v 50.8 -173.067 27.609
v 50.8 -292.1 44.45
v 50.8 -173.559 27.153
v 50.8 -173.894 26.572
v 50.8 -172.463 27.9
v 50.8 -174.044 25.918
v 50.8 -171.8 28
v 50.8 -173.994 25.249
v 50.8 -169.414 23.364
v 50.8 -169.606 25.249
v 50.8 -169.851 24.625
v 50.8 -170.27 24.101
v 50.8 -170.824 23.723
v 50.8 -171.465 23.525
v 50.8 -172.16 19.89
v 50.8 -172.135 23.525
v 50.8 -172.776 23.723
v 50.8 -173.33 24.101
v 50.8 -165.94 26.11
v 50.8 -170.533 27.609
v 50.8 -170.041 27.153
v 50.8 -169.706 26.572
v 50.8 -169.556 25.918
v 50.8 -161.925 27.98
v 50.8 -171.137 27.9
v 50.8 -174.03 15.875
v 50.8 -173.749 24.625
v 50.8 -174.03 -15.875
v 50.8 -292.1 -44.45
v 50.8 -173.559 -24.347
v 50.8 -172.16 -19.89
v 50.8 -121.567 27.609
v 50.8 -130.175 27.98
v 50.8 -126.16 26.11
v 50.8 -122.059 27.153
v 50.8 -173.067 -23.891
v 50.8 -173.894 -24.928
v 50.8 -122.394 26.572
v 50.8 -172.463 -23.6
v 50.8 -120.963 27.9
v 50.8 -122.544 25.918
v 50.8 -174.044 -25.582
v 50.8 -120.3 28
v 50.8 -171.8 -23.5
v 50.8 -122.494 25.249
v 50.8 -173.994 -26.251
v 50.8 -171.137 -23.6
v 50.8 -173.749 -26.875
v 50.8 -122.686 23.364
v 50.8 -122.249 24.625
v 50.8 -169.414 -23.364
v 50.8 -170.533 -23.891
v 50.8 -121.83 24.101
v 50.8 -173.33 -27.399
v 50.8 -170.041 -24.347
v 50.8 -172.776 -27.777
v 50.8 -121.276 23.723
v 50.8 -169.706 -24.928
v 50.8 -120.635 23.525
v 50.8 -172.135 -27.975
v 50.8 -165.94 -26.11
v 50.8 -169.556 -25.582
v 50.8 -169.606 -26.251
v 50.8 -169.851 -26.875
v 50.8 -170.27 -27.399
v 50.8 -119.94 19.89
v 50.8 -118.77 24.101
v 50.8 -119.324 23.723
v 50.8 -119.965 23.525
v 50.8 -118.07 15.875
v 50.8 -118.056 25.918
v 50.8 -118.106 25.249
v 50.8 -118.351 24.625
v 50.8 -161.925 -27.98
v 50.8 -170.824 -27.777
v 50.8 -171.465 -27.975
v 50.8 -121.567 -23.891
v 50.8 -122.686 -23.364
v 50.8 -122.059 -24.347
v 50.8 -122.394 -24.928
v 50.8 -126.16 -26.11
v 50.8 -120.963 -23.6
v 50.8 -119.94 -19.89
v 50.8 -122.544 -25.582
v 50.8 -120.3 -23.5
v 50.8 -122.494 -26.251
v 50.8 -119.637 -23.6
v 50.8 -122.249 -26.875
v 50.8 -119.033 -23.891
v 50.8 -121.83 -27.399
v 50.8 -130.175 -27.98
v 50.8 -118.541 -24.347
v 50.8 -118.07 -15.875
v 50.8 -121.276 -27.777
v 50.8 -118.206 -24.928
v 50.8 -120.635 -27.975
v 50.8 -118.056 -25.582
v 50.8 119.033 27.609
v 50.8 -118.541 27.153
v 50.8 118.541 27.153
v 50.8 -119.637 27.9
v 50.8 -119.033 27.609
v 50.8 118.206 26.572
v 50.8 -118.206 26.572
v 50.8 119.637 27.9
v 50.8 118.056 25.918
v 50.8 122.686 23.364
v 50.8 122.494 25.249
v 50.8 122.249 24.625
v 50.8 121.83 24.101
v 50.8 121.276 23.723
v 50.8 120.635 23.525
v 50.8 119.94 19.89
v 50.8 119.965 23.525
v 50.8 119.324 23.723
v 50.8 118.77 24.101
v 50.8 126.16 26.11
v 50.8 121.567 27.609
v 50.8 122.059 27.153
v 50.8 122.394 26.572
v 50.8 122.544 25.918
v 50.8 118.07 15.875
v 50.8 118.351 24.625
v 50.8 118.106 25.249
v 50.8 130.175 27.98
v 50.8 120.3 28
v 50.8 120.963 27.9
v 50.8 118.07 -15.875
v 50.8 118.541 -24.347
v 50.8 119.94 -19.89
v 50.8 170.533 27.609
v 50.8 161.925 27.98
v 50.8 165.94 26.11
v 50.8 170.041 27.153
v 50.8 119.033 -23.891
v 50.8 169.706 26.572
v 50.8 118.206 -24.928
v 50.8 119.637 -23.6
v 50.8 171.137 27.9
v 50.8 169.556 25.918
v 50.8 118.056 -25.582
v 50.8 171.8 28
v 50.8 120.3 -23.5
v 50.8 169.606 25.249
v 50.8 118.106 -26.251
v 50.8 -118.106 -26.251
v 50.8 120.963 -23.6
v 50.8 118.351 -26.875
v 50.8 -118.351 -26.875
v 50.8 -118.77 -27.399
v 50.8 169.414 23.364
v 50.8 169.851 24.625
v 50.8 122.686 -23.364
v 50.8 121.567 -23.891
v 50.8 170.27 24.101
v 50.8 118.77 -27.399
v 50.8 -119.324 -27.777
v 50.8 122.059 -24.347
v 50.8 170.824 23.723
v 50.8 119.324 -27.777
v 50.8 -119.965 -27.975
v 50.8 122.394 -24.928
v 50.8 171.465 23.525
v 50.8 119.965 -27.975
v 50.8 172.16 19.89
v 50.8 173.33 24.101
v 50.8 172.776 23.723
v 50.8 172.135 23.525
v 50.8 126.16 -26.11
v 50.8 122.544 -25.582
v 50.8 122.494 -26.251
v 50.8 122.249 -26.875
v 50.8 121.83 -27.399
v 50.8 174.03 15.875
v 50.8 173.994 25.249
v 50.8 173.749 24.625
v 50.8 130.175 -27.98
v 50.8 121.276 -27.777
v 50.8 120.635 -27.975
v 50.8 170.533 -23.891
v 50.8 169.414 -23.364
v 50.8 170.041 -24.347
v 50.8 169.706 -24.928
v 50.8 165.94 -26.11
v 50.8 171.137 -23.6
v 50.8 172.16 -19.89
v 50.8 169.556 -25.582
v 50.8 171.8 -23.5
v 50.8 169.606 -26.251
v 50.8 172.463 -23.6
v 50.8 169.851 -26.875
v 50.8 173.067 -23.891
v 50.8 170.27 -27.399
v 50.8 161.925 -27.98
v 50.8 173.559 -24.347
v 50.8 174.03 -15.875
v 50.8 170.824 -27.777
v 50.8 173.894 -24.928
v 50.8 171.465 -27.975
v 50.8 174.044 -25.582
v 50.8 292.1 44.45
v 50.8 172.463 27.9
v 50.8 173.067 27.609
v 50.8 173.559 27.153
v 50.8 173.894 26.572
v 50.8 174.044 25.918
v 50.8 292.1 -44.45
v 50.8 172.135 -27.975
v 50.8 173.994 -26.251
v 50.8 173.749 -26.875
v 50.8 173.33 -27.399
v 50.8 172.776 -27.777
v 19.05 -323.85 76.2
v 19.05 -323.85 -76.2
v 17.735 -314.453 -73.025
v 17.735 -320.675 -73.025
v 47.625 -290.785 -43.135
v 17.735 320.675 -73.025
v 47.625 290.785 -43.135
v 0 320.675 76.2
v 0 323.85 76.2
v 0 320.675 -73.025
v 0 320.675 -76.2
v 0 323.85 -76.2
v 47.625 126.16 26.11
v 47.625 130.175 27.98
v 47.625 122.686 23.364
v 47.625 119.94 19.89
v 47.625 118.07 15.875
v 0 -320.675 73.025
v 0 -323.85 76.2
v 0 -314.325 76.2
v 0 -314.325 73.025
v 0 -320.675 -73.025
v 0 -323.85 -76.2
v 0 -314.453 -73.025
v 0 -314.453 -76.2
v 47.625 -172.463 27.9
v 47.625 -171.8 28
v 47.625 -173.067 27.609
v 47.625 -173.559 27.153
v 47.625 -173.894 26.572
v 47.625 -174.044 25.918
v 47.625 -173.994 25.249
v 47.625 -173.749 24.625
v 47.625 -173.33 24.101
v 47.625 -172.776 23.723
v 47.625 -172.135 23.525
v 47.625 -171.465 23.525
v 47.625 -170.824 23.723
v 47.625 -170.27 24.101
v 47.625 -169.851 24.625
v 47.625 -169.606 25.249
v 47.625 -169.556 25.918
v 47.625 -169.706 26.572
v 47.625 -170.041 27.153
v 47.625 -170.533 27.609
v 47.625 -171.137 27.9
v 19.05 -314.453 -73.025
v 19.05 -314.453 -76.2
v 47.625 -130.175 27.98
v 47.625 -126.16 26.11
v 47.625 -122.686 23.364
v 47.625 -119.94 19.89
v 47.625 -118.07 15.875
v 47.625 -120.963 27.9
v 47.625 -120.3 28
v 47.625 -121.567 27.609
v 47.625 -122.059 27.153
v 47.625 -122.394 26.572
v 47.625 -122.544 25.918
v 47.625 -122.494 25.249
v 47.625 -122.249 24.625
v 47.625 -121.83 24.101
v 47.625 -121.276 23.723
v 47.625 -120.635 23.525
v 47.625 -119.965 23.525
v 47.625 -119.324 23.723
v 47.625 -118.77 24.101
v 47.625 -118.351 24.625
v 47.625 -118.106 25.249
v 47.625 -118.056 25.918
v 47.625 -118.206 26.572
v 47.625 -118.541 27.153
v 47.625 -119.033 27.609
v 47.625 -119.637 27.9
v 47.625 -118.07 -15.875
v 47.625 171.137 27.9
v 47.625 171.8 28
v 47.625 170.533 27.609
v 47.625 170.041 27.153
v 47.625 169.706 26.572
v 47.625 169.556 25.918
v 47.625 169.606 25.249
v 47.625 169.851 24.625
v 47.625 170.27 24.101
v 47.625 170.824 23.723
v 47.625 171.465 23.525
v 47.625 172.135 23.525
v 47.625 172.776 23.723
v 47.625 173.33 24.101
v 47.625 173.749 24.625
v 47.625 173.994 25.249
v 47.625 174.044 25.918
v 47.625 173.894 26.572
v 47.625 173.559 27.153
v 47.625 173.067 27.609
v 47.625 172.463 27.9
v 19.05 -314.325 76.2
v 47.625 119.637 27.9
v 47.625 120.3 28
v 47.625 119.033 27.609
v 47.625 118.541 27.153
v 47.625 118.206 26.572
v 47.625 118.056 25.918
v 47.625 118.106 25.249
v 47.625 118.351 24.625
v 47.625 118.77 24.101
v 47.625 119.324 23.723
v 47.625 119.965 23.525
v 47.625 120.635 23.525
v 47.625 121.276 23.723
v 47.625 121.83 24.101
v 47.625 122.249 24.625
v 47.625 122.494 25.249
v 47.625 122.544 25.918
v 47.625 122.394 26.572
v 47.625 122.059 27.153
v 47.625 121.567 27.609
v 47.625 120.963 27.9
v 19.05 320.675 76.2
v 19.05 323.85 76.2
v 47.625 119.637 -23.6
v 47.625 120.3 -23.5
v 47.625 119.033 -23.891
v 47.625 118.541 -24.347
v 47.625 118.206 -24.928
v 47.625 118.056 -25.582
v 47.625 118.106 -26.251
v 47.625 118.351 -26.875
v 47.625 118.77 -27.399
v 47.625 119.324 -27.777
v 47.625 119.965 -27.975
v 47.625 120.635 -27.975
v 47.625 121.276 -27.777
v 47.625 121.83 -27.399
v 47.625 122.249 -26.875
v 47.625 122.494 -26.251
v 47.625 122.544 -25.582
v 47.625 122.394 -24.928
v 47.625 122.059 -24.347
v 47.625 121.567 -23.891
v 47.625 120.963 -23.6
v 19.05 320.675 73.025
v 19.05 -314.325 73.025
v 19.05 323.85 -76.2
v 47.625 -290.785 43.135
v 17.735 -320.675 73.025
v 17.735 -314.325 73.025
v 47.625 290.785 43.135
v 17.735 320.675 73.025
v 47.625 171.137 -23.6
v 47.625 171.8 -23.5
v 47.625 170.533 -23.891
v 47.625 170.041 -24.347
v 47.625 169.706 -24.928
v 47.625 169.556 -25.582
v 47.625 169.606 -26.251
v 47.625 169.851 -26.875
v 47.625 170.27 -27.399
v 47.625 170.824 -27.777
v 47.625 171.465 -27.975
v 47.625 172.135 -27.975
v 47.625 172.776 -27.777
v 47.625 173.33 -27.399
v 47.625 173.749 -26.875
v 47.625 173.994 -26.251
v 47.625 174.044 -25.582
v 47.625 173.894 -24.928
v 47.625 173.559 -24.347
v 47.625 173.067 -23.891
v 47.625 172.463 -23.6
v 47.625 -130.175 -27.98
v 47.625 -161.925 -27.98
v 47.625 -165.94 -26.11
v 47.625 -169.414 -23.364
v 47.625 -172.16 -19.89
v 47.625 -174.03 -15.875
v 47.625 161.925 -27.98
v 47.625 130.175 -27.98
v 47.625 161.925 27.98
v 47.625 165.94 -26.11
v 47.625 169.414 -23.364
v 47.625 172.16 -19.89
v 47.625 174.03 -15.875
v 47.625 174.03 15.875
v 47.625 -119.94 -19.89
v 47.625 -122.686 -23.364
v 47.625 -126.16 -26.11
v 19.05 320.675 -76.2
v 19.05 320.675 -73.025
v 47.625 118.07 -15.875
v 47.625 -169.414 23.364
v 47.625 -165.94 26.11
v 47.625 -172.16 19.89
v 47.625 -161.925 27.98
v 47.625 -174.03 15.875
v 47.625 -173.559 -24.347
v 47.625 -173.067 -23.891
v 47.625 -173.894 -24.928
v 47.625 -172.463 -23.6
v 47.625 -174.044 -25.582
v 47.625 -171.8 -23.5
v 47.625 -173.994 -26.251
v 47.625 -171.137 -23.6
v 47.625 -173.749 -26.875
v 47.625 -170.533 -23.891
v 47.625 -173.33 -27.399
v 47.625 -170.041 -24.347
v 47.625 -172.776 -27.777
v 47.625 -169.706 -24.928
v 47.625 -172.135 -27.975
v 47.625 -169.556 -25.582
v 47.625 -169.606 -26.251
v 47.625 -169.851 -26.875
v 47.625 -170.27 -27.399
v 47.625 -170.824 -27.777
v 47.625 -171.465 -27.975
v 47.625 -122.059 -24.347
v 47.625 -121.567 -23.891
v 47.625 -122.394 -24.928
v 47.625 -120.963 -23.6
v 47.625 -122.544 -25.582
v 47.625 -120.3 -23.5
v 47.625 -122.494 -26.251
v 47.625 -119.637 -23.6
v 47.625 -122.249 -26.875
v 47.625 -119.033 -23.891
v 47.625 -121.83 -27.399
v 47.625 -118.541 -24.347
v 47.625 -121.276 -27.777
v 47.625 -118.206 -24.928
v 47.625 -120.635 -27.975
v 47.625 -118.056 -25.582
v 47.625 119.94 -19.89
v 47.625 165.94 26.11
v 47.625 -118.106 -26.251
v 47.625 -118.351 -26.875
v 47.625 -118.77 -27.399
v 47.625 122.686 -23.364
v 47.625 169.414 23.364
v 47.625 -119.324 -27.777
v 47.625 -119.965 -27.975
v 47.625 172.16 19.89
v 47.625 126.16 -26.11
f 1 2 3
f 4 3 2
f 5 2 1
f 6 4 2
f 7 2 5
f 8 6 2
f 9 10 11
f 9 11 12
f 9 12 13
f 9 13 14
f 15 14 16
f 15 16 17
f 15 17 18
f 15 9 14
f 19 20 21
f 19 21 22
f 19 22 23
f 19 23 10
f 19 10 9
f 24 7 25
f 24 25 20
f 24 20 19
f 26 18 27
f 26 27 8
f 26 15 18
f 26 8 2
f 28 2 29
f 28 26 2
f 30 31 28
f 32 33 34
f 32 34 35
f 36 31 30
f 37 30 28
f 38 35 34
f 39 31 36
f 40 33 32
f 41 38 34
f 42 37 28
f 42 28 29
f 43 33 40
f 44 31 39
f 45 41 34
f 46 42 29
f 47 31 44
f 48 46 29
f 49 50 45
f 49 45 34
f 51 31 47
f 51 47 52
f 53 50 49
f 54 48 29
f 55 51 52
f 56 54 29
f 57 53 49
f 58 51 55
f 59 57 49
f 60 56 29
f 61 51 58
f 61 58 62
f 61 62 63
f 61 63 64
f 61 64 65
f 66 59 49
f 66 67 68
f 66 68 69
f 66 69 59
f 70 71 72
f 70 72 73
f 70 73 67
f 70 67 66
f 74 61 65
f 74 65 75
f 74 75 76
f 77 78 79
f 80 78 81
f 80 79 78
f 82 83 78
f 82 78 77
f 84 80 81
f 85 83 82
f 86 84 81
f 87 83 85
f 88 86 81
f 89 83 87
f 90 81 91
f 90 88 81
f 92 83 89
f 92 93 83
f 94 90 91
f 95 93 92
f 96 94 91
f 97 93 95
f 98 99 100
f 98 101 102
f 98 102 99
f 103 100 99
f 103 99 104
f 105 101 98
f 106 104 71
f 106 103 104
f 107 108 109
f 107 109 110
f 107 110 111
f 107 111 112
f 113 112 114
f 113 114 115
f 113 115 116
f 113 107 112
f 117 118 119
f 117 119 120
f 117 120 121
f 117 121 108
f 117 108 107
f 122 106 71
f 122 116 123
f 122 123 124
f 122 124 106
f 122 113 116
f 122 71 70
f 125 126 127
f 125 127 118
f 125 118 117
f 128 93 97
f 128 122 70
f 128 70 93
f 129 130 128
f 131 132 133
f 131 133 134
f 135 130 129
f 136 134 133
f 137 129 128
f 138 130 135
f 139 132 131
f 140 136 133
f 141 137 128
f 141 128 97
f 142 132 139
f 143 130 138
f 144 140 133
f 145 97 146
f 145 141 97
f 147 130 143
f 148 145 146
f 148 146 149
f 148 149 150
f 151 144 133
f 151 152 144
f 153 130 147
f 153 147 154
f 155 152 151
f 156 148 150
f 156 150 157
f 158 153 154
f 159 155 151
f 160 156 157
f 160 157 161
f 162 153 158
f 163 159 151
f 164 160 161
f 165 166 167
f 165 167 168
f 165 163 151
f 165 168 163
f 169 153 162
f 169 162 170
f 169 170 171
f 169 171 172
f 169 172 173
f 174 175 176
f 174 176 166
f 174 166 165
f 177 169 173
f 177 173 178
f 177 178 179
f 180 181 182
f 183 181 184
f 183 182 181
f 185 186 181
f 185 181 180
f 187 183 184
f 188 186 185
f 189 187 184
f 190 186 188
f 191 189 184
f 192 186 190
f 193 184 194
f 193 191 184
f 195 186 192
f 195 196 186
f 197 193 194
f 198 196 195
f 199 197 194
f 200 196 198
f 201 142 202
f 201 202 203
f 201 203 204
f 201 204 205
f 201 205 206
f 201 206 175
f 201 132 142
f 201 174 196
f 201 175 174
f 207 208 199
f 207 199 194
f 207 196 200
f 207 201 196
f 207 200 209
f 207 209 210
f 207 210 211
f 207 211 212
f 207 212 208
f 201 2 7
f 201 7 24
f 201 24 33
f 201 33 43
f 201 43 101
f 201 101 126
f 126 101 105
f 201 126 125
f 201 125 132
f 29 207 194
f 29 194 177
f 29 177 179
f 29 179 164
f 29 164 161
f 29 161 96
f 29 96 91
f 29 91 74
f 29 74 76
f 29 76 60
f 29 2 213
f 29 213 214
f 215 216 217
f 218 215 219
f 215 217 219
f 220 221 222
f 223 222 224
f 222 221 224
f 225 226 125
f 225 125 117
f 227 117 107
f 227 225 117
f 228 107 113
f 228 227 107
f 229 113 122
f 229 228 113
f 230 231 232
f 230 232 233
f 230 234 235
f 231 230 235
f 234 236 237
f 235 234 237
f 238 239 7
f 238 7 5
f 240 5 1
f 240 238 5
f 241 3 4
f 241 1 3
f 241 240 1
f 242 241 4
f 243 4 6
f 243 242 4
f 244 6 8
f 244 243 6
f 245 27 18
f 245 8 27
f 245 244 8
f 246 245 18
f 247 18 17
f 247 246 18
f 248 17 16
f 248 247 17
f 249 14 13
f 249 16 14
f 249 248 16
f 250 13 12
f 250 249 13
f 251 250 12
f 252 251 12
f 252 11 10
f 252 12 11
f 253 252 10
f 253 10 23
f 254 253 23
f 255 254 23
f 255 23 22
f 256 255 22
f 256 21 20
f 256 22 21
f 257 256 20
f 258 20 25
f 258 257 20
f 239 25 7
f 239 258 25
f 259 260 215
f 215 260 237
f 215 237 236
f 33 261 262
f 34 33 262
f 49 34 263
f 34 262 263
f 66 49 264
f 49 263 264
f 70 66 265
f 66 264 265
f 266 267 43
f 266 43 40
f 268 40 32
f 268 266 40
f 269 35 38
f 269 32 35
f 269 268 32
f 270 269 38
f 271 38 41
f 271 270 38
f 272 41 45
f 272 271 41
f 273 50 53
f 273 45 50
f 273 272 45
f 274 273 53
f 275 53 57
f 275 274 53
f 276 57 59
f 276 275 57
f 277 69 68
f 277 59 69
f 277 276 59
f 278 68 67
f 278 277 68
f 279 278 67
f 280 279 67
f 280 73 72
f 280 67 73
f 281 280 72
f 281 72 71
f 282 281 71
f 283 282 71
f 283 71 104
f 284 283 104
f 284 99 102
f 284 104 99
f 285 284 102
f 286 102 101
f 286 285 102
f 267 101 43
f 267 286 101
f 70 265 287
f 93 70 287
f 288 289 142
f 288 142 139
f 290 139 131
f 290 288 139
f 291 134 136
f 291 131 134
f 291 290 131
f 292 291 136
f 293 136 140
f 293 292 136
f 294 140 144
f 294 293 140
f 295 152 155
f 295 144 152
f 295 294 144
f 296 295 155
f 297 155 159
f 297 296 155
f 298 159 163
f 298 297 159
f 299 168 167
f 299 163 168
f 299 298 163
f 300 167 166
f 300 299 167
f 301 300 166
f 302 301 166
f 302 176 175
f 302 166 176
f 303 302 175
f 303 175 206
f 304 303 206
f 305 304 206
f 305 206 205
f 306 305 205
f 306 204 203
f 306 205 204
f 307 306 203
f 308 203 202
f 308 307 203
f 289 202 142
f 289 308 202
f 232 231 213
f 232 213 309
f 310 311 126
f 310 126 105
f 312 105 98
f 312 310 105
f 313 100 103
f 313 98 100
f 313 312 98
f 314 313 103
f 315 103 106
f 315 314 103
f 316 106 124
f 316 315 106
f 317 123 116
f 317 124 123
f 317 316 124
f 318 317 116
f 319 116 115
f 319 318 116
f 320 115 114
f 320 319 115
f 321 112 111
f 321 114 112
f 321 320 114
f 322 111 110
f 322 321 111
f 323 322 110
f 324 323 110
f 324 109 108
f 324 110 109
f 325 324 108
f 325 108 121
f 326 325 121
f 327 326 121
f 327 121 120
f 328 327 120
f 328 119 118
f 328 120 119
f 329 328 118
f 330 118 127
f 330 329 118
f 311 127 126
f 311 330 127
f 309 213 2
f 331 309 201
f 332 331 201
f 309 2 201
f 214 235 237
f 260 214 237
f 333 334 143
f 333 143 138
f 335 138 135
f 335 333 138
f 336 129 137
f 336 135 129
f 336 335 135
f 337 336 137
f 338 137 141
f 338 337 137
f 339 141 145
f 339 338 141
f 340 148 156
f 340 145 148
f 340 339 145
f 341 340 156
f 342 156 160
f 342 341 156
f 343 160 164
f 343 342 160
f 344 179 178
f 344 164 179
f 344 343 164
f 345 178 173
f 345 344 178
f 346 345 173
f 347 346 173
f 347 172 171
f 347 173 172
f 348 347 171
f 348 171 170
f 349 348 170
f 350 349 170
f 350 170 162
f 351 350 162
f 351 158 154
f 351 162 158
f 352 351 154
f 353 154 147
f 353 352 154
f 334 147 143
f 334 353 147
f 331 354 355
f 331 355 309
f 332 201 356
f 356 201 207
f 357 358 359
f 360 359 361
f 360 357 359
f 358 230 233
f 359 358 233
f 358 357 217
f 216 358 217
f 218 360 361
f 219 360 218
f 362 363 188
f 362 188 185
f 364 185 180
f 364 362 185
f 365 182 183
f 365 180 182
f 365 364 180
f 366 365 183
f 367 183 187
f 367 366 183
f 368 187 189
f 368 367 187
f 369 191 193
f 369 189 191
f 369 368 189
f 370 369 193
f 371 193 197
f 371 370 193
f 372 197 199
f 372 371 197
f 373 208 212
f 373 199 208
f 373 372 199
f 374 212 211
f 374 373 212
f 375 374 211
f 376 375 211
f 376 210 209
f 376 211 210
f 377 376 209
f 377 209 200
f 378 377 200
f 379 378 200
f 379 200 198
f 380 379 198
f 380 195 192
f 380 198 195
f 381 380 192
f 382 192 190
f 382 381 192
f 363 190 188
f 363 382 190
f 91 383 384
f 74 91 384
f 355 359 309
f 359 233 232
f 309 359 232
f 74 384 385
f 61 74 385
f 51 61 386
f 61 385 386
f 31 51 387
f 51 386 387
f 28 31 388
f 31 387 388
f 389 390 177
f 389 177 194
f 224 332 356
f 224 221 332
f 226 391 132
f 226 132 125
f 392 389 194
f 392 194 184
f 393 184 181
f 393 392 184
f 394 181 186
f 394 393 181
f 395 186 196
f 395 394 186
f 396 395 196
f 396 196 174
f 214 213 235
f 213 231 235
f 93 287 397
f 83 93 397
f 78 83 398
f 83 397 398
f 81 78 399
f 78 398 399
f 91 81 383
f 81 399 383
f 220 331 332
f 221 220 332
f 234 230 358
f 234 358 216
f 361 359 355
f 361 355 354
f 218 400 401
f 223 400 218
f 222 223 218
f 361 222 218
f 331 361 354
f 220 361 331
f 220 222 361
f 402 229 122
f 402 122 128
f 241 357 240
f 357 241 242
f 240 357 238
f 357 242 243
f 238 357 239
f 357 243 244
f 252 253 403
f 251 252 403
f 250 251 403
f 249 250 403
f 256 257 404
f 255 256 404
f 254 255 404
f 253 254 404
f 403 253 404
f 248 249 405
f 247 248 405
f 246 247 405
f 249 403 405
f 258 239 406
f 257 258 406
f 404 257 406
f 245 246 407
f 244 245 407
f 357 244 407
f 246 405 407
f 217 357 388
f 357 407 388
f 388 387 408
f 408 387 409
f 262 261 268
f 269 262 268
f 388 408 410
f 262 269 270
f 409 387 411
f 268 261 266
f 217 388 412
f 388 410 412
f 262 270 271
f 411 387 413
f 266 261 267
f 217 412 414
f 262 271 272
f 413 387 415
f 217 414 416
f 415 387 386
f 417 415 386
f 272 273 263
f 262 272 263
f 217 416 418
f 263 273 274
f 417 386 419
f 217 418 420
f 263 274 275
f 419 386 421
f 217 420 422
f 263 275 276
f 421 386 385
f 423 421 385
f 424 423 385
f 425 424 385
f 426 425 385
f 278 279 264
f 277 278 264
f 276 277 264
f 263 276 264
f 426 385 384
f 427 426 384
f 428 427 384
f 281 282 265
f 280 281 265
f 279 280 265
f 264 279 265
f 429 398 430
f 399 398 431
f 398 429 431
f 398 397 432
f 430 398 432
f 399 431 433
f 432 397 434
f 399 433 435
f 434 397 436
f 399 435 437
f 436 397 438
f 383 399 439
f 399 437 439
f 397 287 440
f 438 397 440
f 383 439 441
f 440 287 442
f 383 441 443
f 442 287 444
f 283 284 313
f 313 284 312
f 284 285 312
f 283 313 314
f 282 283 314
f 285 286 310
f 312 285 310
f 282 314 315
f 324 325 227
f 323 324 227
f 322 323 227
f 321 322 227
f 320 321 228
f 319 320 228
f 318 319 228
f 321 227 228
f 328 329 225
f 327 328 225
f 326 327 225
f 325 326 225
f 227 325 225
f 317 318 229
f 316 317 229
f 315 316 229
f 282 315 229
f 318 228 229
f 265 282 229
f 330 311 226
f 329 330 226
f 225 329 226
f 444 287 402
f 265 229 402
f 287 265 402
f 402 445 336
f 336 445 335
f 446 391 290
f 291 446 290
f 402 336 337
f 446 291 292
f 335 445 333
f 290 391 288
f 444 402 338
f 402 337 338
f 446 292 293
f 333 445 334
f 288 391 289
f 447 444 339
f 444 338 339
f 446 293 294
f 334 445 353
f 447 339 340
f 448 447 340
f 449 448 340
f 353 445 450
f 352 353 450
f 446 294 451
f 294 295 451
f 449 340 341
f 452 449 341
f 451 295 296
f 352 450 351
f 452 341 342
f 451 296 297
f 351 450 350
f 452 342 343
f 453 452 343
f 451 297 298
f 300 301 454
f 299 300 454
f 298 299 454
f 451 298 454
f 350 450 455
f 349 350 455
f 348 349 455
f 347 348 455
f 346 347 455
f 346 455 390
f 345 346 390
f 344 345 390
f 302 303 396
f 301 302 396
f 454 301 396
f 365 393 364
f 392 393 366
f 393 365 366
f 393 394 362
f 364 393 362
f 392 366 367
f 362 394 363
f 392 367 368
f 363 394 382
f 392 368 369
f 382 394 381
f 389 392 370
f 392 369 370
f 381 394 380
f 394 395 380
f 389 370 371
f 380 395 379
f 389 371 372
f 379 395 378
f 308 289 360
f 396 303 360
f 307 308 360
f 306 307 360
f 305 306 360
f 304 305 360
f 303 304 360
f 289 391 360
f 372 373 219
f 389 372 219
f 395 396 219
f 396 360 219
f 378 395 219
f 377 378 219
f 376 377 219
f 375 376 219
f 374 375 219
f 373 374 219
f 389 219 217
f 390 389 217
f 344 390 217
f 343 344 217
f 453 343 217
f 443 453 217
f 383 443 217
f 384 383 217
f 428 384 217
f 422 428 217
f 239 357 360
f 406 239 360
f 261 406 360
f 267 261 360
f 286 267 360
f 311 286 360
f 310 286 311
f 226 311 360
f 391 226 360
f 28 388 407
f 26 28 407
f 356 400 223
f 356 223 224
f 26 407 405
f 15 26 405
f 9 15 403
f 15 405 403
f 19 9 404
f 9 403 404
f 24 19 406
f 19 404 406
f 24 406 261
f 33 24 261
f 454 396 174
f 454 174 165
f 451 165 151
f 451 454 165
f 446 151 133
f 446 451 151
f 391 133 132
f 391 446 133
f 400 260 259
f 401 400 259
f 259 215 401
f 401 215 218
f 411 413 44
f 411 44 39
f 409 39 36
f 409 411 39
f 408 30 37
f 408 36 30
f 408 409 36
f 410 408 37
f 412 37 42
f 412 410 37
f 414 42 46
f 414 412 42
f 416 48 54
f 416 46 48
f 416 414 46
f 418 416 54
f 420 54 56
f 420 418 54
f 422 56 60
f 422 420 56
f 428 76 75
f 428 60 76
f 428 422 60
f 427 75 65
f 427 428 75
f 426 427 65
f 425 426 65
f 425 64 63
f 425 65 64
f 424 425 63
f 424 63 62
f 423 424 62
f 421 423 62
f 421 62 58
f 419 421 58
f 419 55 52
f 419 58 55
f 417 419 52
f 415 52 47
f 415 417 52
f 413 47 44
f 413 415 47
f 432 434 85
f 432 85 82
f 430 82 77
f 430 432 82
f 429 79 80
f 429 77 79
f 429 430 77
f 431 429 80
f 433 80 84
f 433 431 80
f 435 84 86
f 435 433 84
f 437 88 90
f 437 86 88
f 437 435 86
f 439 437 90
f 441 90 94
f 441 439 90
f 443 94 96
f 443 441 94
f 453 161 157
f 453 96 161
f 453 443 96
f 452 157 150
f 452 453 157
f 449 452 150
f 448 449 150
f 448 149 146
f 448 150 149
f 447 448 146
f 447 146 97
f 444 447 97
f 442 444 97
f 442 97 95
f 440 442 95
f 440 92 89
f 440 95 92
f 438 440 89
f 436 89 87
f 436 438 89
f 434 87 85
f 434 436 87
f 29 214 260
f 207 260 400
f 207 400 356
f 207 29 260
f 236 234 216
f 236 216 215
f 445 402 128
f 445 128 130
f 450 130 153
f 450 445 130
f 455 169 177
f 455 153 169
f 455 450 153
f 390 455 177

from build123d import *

# Parameters (mm, degrees)
SKETCH2_W               = 152.4
SKETCH2_H               = 647.7
BOSS_EXTRUDE1_DEPTH     = 50.8
CHAMFER1_SIZE           = 31.75
CHAMFER2_SIZE           = 31.75
SHELL1_T                = -3.175
SKETCH3_W               = 3.175
SKETCH3_H               = 635.128365157
SKETCH3_H_2             = 635
CUT_EXTRUDE1_DEPTH      = 19.05
CUT_EXTRUDE2_DEPTH      = 337.55
CUT_EXTRUDE2_DEPTH_BACK = 337.55
SKETCH4_R               = 2.25


with BuildPart() as part:
    # Sketch2 → Boss-Extrude1 (new body)
    with BuildSketch(Plane(origin=(0, 0, 0), x_dir=(0, 0, -1), z_dir=(1, 0, 0))):
        Rectangle(SKETCH2_W, SKETCH2_H)
    extrude(amount=BOSS_EXTRUDE1_DEPTH)

    # Chamfer1
    chamfer1_edges = [part.edges().sort_by_distance(p)[0] for p in [
        (50.8, 0, 76.2),
        (50.8, 0, -76.2),
    ]]
    chamfer(chamfer1_edges, length=CHAMFER1_SIZE)

    # Chamfer2
    chamfer2_edges = [part.edges().sort_by_distance(p)[0] for p in [
        (50.8, -323.85, 0),
        (50.8, 323.85, 0),
    ]]
    chamfer(chamfer2_edges, length=CHAMFER2_SIZE)

    # Shell1
    shell1_openings = [part.faces().sort_by_distance(p)[0] for p in [
        (0, 0, 0),
    ]]
    offset(amount=SHELL1_T, openings=shell1_openings, kind=Kind.INTERSECTION)

    # Sketch3 → Cut-Extrude1 (cut)
    with BuildSketch(Plane.ZY):
        with Locations((-74.6125, 3.110817422)):
            Rectangle(SKETCH3_W, SKETCH3_H)
        with Locations((74.6125, 3.175)):
            Rectangle(SKETCH3_W, SKETCH3_H_2)
    extrude(amount=-CUT_EXTRUDE1_DEPTH, mode=Mode.SUBTRACT)

    # Sketch4 → Cut-Extrude2 (cut, two sides: drawn at the far end of the back side and taken through both)
    with BuildSketch(Plane(origin=(50.8, 0, 0), x_dir=(0, 0, -1), z_dir=(1, 0, 0)).offset(-CUT_EXTRUDE2_DEPTH_BACK)):
        with Locations(Location((-25.75, 171.8, 0), (0, 0, 180))):
            Circle(SKETCH4_R)
        with Locations(Location((25.75, 171.8, 0), (0, 0, 180))):
            Circle(SKETCH4_R)
        with Locations(Location((-25.75, 120.3, 0), (0, 0, 180))):
            Circle(SKETCH4_R)
        with Locations(Location((25.75, 120.3, 0), (0, 0, 180))):
            Circle(SKETCH4_R)
        with Locations(Location((-25.75, -120.3, 0), (0, 0, 180))):
            Circle(SKETCH4_R)
        with Locations(Location((25.75, -120.3, 0), (0, 0, 180))):
            Circle(SKETCH4_R)
        with Locations(Location((25.75, -171.8, 0), (0, 0, 180))):
            Circle(SKETCH4_R)
        with Locations(Location((-25.75, -171.8, 0), (0, 0, 180))):
            Circle(SKETCH4_R)
        with BuildLine():
            Line((-27.98, 161.925), (-27.98, 130.175))
            ThreePointArc((-27.98, 130.175), (-23.3638286, 122.6861714), (-15.875, 118.07))
            Line((-15.875, 118.07), (15.875, 118.07))
            ThreePointArc((15.875, 118.07), (23.3638286, 122.6861714), (27.98, 130.175))
            Line((27.98, 130.175), (27.98, 161.925))
            ThreePointArc((27.98, 161.925), (23.3638286, 169.4138286), (15.875, 174.03))
            Line((15.875, 174.03), (-15.875, 174.03))
            ThreePointArc((-15.875, 174.03), (-23.3638286, 169.4138286), (-27.98, 161.925))
        make_face()
        with BuildLine():
            Line((-27.98, -161.925), (-27.98, -130.175))
            ThreePointArc((-27.98, -130.175), (-23.3638286, -122.6861714), (-15.875, -118.07))
            Line((-15.875, -118.07), (15.875, -118.07))
            ThreePointArc((15.875, -118.07), (23.3638286, -122.6861714), (27.98, -130.175))
            Line((27.98, -130.175), (27.98, -161.925))
            ThreePointArc((27.98, -161.925), (23.3638286, -169.4138286), (15.875, -174.03))
            Line((15.875, -174.03), (-15.875, -174.03))
            ThreePointArc((-15.875, -174.03), (-23.3638286, -169.4138286), (-27.98, -161.925))
        make_face()
    extrude(amount=CUT_EXTRUDE2_DEPTH + CUT_EXTRUDE2_DEPTH_BACK, mode=Mode.SUBTRACT)


solid = part.part
